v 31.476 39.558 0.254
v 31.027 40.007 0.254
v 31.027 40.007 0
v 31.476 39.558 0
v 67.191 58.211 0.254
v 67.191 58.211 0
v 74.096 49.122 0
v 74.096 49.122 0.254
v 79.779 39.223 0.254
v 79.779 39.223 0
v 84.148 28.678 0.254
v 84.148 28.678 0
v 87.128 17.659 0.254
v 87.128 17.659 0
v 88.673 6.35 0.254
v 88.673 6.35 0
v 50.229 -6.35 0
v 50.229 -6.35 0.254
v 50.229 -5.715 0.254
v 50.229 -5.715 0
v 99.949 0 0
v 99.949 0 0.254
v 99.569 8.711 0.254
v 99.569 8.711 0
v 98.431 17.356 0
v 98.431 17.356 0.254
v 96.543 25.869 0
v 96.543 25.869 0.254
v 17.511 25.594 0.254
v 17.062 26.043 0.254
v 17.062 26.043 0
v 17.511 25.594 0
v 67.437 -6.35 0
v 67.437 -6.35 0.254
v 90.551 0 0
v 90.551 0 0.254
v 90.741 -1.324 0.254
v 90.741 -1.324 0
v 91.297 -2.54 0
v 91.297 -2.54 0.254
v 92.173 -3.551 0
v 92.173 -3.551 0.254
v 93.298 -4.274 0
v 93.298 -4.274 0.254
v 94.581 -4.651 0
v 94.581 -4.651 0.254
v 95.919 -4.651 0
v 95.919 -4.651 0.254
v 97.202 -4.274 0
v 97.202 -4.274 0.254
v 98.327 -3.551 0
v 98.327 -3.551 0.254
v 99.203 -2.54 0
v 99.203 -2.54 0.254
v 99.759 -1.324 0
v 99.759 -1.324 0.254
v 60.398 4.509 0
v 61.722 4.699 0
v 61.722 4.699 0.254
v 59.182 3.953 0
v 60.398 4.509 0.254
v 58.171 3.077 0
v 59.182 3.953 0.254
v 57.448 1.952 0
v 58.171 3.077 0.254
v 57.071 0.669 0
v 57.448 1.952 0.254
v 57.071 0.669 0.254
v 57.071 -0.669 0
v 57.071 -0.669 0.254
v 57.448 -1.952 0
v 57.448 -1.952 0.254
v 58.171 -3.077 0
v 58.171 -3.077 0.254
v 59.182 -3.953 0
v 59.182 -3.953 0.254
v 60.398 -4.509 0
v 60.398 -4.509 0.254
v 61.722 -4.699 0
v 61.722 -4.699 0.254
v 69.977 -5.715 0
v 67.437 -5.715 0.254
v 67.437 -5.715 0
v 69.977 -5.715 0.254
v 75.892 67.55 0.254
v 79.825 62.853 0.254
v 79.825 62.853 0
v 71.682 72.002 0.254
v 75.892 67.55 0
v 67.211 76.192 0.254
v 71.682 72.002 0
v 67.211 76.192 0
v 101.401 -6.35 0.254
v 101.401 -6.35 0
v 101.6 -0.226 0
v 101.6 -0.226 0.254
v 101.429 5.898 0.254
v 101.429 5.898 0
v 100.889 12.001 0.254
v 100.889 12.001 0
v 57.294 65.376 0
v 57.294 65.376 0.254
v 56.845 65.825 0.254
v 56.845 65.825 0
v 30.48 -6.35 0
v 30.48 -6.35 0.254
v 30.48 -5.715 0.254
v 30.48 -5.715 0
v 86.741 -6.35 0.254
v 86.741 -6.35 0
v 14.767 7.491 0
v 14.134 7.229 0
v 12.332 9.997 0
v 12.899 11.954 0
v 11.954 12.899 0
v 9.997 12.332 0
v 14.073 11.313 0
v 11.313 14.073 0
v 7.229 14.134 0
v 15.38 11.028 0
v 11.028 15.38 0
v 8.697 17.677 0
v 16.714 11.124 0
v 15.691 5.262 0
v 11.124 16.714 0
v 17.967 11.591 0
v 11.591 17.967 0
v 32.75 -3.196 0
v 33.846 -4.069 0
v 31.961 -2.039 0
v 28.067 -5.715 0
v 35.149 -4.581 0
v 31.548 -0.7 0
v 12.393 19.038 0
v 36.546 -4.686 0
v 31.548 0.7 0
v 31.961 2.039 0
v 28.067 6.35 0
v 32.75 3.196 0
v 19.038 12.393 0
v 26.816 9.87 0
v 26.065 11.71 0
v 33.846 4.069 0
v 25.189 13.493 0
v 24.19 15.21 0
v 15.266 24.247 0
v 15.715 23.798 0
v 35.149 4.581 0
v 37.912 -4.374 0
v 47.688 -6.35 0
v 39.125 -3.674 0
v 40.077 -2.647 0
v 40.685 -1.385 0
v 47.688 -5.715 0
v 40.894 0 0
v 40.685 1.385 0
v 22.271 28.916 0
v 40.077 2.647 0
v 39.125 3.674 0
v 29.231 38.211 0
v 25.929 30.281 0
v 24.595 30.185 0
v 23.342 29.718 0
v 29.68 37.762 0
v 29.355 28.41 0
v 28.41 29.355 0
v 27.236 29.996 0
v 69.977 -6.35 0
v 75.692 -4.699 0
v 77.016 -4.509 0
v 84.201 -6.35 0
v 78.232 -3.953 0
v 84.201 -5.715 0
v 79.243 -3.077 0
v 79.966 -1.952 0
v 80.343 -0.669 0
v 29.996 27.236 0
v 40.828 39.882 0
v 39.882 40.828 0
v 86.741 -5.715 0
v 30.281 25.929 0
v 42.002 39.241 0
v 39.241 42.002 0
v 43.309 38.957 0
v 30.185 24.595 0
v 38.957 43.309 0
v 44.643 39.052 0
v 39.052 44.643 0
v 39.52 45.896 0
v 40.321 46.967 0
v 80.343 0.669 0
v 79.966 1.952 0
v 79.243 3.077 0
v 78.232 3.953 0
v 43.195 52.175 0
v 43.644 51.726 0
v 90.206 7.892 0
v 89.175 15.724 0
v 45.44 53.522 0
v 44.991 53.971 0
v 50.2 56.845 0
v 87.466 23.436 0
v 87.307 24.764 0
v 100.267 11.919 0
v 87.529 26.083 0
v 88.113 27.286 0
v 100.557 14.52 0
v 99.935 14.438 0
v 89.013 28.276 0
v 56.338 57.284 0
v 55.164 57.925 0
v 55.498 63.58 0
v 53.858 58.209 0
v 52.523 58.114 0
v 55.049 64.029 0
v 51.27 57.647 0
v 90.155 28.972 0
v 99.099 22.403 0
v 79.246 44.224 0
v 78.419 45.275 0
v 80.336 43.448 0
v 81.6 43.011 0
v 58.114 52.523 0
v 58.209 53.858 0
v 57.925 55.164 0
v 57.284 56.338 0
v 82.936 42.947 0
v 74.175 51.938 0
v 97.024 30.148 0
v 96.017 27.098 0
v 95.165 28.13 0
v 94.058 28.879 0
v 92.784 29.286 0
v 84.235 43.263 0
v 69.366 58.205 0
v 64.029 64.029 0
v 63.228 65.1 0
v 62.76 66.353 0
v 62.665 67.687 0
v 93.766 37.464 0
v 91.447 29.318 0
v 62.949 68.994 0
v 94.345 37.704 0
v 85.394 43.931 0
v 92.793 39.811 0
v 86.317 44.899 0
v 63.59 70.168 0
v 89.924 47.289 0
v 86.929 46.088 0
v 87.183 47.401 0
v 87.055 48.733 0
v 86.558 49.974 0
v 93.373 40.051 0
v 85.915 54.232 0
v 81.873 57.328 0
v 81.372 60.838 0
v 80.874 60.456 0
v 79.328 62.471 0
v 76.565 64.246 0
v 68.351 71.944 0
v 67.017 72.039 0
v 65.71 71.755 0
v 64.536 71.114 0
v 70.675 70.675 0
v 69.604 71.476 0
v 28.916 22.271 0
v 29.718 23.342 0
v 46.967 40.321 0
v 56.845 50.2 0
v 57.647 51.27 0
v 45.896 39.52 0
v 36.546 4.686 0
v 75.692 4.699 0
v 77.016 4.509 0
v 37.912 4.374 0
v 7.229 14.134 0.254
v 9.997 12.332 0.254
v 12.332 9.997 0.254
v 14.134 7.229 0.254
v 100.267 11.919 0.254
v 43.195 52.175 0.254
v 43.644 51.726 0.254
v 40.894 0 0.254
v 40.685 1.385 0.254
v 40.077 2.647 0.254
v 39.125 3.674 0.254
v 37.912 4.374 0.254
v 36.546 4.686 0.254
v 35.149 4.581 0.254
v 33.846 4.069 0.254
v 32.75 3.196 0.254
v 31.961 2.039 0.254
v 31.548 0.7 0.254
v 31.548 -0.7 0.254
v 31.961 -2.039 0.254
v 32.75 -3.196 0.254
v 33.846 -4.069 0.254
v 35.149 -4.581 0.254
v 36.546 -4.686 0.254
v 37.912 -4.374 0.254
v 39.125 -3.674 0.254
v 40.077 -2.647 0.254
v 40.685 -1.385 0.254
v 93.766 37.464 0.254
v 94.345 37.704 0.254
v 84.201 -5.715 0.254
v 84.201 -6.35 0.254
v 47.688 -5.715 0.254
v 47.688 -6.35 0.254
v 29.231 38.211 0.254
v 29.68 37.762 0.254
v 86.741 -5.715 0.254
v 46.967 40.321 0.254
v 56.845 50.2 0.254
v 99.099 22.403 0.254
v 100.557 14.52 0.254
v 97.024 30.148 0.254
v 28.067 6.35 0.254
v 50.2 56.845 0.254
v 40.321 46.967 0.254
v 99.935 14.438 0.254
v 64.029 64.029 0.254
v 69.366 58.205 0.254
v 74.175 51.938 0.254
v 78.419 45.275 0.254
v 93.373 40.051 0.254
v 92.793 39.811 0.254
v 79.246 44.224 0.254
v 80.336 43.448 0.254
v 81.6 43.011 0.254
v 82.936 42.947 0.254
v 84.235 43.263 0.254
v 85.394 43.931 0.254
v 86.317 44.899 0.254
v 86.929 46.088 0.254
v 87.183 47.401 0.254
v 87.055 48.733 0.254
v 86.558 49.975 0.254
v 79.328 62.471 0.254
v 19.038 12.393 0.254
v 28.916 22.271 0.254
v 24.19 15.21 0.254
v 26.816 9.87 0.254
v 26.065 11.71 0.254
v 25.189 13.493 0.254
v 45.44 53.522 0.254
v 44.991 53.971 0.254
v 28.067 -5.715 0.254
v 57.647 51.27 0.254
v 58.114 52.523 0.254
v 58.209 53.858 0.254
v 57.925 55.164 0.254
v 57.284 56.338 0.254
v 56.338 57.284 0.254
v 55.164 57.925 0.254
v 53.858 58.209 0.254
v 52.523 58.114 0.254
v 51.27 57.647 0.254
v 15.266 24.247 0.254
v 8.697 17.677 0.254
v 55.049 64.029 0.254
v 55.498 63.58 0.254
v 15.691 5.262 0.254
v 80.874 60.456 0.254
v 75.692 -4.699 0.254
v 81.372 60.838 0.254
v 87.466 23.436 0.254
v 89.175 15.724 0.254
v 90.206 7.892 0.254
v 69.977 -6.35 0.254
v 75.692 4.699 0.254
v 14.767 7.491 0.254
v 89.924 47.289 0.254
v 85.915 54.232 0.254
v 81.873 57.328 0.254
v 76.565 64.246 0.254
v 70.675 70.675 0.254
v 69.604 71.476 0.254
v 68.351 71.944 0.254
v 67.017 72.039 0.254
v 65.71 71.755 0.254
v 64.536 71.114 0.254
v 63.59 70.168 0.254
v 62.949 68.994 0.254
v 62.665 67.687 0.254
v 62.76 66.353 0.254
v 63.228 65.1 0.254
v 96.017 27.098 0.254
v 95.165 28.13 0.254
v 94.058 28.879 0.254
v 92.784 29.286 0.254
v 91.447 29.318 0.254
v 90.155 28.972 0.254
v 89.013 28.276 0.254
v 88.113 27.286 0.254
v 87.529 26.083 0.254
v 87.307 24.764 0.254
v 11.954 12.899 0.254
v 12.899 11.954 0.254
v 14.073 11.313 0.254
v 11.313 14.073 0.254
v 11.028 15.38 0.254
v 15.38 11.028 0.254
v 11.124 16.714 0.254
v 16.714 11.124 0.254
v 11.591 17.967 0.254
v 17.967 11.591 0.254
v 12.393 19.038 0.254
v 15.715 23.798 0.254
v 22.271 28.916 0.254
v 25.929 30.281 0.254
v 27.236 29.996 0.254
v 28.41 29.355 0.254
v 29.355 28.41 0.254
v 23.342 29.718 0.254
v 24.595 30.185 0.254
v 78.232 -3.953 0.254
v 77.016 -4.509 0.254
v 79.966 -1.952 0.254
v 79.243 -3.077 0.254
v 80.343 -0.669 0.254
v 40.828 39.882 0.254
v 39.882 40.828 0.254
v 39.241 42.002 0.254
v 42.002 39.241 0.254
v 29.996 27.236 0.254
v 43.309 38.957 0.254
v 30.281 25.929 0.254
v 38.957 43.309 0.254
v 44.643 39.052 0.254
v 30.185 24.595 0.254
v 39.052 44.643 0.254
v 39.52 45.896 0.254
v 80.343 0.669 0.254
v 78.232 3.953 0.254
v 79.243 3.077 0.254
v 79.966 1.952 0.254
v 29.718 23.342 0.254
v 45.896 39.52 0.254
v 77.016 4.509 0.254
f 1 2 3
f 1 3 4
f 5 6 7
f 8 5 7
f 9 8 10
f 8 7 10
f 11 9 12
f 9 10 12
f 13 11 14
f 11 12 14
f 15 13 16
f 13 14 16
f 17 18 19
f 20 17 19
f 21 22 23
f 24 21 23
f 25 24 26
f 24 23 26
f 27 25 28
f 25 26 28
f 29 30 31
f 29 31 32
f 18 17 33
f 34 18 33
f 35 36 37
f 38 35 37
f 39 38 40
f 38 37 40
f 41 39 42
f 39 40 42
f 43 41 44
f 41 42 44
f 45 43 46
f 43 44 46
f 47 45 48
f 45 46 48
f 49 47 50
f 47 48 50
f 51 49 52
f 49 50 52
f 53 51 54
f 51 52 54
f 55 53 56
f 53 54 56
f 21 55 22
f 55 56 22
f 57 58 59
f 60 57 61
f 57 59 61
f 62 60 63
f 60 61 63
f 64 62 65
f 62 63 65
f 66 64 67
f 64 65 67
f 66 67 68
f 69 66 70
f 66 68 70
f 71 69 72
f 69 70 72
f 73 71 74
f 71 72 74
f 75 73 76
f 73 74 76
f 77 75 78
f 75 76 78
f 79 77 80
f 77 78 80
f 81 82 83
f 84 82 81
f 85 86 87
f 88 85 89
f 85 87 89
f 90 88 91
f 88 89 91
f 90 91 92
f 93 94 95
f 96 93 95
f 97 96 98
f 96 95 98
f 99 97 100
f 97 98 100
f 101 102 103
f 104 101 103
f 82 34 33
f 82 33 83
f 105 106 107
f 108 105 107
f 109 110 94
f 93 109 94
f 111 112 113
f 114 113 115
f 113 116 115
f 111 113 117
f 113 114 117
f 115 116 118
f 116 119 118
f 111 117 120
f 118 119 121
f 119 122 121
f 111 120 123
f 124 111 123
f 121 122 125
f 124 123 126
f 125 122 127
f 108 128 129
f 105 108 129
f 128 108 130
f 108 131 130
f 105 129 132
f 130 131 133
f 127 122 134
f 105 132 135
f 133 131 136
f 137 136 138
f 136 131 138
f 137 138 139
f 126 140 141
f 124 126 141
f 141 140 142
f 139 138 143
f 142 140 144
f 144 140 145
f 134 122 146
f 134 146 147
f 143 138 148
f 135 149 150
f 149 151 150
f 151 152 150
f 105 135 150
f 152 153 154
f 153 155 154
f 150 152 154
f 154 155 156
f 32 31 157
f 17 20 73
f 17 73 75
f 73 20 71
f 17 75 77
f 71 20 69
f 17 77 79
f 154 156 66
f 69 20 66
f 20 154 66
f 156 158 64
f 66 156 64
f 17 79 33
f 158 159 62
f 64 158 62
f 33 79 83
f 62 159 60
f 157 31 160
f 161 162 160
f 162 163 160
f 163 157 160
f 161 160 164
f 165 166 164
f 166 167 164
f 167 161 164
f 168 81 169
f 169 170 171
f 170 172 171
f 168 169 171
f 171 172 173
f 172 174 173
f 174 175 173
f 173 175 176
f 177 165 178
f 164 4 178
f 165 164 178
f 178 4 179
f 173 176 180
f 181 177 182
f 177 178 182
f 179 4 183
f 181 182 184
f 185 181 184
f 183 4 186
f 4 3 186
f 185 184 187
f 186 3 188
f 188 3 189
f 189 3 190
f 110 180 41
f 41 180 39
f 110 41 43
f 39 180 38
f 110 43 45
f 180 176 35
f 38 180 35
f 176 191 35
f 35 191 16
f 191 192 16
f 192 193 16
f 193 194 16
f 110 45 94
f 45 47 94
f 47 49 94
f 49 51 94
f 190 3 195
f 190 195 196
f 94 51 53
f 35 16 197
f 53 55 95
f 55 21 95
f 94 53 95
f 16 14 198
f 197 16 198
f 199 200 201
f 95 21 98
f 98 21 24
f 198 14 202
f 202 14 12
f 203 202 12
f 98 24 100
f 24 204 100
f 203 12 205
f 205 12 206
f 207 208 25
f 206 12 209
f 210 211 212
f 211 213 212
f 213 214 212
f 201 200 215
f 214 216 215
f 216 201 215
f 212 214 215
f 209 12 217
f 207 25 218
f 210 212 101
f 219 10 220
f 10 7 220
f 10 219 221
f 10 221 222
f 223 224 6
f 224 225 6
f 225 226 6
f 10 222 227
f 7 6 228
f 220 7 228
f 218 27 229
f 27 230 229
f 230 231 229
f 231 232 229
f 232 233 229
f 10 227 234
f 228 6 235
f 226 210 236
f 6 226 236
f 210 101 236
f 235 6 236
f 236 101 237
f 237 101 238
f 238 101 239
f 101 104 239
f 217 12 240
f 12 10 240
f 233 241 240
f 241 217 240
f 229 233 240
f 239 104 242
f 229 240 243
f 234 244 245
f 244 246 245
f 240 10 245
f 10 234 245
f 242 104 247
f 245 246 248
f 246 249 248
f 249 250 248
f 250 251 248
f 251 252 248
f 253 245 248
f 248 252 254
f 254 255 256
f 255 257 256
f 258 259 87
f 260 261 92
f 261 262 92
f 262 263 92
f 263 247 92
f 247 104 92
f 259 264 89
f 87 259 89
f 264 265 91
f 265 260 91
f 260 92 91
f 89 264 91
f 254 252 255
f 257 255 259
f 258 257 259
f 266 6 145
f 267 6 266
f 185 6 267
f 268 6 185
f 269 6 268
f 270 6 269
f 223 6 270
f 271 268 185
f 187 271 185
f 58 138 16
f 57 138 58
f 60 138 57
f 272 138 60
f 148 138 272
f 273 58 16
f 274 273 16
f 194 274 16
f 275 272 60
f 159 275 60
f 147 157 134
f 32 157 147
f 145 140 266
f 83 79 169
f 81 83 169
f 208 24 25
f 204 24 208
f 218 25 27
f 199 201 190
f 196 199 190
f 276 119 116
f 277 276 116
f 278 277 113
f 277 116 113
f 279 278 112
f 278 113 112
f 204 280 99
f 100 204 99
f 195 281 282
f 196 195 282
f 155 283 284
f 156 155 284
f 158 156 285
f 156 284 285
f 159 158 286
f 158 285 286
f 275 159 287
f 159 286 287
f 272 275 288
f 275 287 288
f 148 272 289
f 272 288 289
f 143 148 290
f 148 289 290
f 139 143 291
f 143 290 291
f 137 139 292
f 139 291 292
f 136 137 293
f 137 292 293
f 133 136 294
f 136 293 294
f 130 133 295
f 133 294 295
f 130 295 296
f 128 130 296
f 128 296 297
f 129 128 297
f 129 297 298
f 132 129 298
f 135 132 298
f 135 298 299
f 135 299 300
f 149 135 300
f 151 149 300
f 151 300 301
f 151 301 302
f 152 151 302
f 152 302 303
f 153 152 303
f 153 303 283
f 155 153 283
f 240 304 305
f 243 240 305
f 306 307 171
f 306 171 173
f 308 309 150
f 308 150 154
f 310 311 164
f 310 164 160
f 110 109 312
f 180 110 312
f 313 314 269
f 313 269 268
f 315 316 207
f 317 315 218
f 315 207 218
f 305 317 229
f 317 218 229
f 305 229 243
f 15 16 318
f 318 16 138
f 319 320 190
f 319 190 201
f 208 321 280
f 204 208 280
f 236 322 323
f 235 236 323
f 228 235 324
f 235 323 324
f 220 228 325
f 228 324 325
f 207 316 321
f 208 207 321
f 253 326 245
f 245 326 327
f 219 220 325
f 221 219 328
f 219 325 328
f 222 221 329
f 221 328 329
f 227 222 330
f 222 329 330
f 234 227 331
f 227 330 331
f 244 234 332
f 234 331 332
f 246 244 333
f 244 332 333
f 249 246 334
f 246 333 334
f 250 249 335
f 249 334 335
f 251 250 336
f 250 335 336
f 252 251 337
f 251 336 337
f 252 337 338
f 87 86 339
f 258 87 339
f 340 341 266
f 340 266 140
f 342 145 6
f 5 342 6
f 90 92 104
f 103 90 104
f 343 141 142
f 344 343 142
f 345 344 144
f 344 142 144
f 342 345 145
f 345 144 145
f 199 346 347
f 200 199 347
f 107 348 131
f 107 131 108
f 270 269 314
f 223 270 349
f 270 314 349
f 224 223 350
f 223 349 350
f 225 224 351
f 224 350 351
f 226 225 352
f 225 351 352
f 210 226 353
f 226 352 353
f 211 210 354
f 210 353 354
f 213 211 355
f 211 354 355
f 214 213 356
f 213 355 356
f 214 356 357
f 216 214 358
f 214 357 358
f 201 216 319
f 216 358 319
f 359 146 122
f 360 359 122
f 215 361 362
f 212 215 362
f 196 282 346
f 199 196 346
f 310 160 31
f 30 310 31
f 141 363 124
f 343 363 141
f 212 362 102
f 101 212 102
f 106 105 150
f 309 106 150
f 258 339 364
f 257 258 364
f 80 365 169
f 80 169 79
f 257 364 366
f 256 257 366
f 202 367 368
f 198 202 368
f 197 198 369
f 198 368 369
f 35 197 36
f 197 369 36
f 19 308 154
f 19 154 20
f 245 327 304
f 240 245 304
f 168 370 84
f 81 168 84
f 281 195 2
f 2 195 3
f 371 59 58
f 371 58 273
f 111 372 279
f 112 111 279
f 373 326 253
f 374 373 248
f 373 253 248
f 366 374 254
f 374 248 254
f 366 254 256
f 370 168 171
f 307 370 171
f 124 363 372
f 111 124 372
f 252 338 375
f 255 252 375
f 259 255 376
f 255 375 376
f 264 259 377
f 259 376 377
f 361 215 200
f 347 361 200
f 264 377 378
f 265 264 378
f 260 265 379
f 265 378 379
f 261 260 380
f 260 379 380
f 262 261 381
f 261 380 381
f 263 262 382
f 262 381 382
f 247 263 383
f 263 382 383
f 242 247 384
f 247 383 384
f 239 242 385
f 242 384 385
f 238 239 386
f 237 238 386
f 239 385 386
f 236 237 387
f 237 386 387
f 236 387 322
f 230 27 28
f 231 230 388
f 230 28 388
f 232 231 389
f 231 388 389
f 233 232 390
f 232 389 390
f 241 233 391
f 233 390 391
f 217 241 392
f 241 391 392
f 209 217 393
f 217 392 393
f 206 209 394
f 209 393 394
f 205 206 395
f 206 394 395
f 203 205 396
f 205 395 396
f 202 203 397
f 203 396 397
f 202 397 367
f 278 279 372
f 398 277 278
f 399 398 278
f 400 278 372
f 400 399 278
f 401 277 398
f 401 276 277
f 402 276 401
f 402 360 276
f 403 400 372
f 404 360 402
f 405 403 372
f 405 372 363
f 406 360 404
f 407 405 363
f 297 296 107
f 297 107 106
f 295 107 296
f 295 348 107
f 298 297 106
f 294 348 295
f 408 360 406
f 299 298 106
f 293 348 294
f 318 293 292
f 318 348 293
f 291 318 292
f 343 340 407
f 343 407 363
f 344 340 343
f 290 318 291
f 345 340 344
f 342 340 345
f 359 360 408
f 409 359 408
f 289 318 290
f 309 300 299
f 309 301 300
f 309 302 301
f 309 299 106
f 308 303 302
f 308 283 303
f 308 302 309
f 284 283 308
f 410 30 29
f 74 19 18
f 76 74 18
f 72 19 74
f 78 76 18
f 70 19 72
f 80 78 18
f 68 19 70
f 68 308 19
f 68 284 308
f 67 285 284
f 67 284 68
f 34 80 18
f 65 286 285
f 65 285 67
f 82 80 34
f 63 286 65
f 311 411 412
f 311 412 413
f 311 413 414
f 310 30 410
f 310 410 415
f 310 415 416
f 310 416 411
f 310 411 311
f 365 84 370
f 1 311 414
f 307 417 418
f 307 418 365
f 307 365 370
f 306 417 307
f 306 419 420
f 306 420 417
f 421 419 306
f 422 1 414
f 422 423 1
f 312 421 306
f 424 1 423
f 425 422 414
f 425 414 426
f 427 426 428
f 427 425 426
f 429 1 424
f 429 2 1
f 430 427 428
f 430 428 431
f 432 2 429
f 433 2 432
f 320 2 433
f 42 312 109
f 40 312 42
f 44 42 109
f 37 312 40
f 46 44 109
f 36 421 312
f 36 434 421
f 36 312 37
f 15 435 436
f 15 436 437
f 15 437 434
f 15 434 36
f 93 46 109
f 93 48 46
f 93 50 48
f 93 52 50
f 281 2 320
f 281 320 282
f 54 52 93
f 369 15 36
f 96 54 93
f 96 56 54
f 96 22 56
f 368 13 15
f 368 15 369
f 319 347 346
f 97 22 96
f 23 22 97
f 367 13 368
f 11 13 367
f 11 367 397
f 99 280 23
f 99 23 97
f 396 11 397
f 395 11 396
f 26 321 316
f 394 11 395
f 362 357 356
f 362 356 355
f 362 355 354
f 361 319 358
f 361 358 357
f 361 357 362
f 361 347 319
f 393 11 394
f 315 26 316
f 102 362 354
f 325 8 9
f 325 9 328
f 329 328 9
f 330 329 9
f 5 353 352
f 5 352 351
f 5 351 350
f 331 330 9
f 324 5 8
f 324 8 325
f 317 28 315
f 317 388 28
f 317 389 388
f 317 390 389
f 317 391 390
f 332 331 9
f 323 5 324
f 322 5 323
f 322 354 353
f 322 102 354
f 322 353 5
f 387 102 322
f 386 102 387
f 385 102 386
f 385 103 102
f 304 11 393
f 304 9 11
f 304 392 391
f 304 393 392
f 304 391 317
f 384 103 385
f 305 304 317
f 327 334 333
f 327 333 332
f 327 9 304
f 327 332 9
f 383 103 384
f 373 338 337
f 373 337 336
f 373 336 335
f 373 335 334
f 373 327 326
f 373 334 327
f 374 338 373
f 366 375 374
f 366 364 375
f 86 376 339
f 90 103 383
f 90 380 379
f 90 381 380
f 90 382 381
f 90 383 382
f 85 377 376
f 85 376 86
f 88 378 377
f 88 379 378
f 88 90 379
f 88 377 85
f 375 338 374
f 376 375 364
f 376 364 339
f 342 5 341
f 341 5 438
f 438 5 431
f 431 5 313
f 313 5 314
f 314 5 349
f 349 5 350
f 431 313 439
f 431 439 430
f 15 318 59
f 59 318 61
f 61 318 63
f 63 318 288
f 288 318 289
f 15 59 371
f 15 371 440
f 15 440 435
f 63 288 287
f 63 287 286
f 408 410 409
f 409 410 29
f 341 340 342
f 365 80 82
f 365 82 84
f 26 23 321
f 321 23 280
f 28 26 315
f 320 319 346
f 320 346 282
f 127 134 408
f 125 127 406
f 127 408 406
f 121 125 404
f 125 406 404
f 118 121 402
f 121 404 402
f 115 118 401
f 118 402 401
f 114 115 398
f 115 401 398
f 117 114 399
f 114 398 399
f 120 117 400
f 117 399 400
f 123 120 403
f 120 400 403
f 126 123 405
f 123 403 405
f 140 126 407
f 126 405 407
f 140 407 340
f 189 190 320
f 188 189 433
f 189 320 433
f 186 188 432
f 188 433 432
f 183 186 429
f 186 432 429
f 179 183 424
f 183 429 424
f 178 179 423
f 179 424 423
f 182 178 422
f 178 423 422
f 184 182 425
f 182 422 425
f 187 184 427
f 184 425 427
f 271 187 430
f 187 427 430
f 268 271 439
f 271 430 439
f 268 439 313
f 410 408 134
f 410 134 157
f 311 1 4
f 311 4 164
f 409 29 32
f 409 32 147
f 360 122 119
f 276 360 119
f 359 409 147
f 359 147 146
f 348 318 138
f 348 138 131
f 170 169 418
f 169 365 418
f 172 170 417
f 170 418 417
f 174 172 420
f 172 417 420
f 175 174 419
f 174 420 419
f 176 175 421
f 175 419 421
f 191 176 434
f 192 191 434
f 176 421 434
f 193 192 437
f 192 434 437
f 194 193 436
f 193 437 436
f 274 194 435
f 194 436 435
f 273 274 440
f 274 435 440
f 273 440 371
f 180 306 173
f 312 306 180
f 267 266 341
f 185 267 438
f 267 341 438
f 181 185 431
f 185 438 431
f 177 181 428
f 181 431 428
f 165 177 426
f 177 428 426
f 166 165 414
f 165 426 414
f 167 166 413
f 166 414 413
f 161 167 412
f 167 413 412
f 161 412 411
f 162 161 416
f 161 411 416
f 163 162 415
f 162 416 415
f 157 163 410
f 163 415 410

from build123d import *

# Parameters (mm, degrees)
BOSS_EXTRUDE1_DEPTH = 0.254
SKETCH2_R           = 4.699
CUT_EXTRUDE1_DEPTH  = 1.254
SKETCH3_W           = 2.54
SKETCH3_H           = 0.635
CUT_EXTRUDE2_DEPTH  = 1.254
CUT_EXTRUDE4_DEPTH  = 1.254
CUT_EXTRUDE5_DEPTH  = 1.254


with BuildPart() as part:
    # Sketch1 → Boss-Extrude1 (new body)
    with BuildSketch(Plane.XY):
        with BuildLine():
            Line((67.21146711, 76.191723231), (8.696654013, 17.676910134))
            Line((8.696654013, 17.676910134), (7.228954972, 14.133571205))
            ThreePointArc((7.228954972, 14.133571205), (14.666587579, 6.075099489), (15.105587123, -4.88230096))
            Line((15.105587123, -4.88230096), (18.648926052, -6.35))
            Line((18.648926052, -6.35), (101.401368334, -6.35))
            ThreePointArc((101.401368334, -6.35), (93.866160503, 38.880636728), (67.21146711, 76.191723231))
        make_face()
        with BuildLine():
            Line((88.672924278, 6.35), (27.86051193, 6.35))
            ThreePointArc((27.86051193, 6.35), (26.399857642, 10.93517908), (24.190484974, 15.210228852))
            Line((24.190484974, 15.210228852), (67.191354125, 58.211098004))
            ThreePointArc((67.191354125, 58.211098004), (82.13289044, 34.020557137), (88.672924278, 6.35))
        make_face(mode=Mode.SUBTRACT)
    extrude(amount=BOSS_EXTRUDE1_DEPTH)

    # Sketch2 → Cut-Extrude1 (cut, through all)
    with BuildSketch(Plane.XY.offset(0.254)):
        with Locations((22.225, 0)):
            Circle(SKETCH2_R)
        with Locations((36.195, 0)):
            Circle(SKETCH2_R)
        with Locations((61.722, 0)):
            Circle(SKETCH2_R)
        with Locations((75.692, 0)):
            Circle(SKETCH2_R)
        with Locations((95.25, 0)):
            Circle(SKETCH2_R)
        with Locations((15.715448212, 15.715448212)):
            Circle(SKETCH2_R)
        with Locations((25.593729945, 25.593729945)):
            Circle(SKETCH2_R)
        with Locations((43.644044748, 43.644044748)):
            Circle(SKETCH2_R)
        with Locations((53.522326482, 53.522326482)):
            Circle(SKETCH2_R)
        with Locations((92.004434954, 24.652514046)):
            Circle(SKETCH2_R)
        with Locations((82.48891971, 47.625)):
            Circle(SKETCH2_R)
        with Locations((67.351920908, 67.351920908)):
            Circle(SKETCH2_R)
    extrude(amount=-CUT_EXTRUDE1_DEPTH, mode=Mode.SUBTRACT)

    # Sketch3 → Cut-Extrude2 (cut, through all)
    with BuildSketch(Plane.XY.offset(0.254)):
        Polygon((15.266435406, 24.246691527), (17.06248663, 26.042742751), (17.511499436, 25.593729945), (15.715448212, 23.797678721), align=None)
        Polygon((44.991083167, 53.971339288), (43.195031942, 52.175288063), (43.644044748, 51.726275257), (45.440095973, 53.522326482), align=None)
        with Locations((29.21, -6.0325)):
            Rectangle(SKETCH3_W, SKETCH3_H)
        with Locations((68.707, -6.0325)):
            Rectangle(SKETCH3_W, SKETCH3_H)
        Polygon((29.230733674, 38.210989795), (31.026784898, 40.007041019), (31.475797704, 39.558028213), (29.67974648, 37.761976989), align=None)
        Polygon((56.845021246, 65.825277367), (55.048970022, 64.029226143), (55.497982828, 63.580213337), (57.294034052, 65.376264561), align=None)
        with Locations((48.9585, -6.0325)):
            Rectangle(SKETCH3_W, SKETCH3_H)
        with Locations((85.471, -6.0325)):
            Rectangle(SKETCH3_W, SKETCH3_H)
        Polygon((99.935462164, 14.437711971), (100.266998693, 11.919442024), (101.526133667, 12.085210288), (101.194597138, 14.603480236), align=None)
        Polygon((93.765504959, 37.464305742), (94.938831965, 37.950313702), (93.966816047, 40.296967714), (92.793489041, 39.810959755), align=None)
        Polygon((79.327792988, 62.471156422), (80.874047017, 60.456038938), (81.88160576, 61.229165953), (80.33535173, 63.244283437), align=None)
        Polygon((13.593916116, 7.005422516), (14.565932035, 4.658768503), (15.739259041, 5.144776462), (14.767243123, 7.491430475), align=None)
    extrude(amount=-CUT_EXTRUDE2_DEPTH, mode=Mode.SUBTRACT)

    # Sketch6 → Cut-Extrude4 (cut, through all)
    with BuildSketch(Plane.XY.offset(0.254)):
        with BuildLine():
            Line((12.392753447, 19.038142977), (22.27103518, 28.91642471))
            ThreePointArc((22.27103518, 28.91642471), (28.91642471, 28.91642471), (28.91642471, 22.27103518))
            Line((28.91642471, 22.27103518), (19.038142977, 12.392753447))
            ThreePointArc((19.038142977, 12.392753447), (12.392753447, 12.392753447), (12.392753447, 19.038142977))
        make_face()
        with BuildLine():
            Line((40.321349984, 46.966739513), (50.199631717, 56.845021246))
            ThreePointArc((50.199631717, 56.845021246), (56.845021246, 56.845021246), (56.845021246, 50.199631717))
            Line((56.845021246, 50.199631717), (46.966739513, 40.321349984))
            ThreePointArc((46.966739513, 40.321349984), (40.321349984, 40.321349984), (40.321349984, 46.966739513))
        make_face()
        with BuildLine():
            Line((61.722, 4.699), (75.692, 4.699))
            ThreePointArc((75.692, 4.699), (80.391, 0), (75.692, -4.699))
            Line((75.692, -4.699), (61.722, -4.699))
            ThreePointArc((61.722, -4.699), (57.023, 0), (61.722, 4.699))
        make_face()
        with BuildLine():
            ThreePointArc((99.949, 0), (99.093922449, 13.045962386), (96.543320412, 25.868704739))
            ThreePointArc((96.543320412, 25.868704739), (90.788244261, 29.191399504), (87.465549496, 23.436323353))
            ThreePointArc((87.465549496, 23.436323353), (89.776323642, 11.819277232), (90.551, 0))
            ThreePointArc((90.551, 0), (95.25, -4.699), (99.949, 0))
        make_face()
        with BuildLine():
            ThreePointArc((86.558373083, 49.9745), (79.294873009, 60.845096068), (70.674615673, 70.674615673))
            ThreePointArc((70.674615673, 70.674615673), (64.029226143, 70.674615673), (64.029226143, 64.029226143))
            ThreePointArc((64.029226143, 64.029226143), (71.838938317, 55.123956158), (78.419466338, 45.2755))
            ThreePointArc((78.419466338, 45.2755), (84.83841971, 43.555546628), (86.558373083, 49.9745))
        make_face()
    extrude(amount=-CUT_EXTRUDE4_DEPTH, mode=Mode.SUBTRACT)

    # Sketch5 → Cut-Extrude5 (cut, through all)
    with BuildSketch(Plane.XY.offset(0.254)):
        Polygon((11.640421912, 3.584446343), (28.067, 10.38855777), (28.067, -7.62), (11.640421912, -7.62), align=None)
    extrude(amount=-CUT_EXTRUDE5_DEPTH, mode=Mode.SUBTRACT)


solid = part.part
